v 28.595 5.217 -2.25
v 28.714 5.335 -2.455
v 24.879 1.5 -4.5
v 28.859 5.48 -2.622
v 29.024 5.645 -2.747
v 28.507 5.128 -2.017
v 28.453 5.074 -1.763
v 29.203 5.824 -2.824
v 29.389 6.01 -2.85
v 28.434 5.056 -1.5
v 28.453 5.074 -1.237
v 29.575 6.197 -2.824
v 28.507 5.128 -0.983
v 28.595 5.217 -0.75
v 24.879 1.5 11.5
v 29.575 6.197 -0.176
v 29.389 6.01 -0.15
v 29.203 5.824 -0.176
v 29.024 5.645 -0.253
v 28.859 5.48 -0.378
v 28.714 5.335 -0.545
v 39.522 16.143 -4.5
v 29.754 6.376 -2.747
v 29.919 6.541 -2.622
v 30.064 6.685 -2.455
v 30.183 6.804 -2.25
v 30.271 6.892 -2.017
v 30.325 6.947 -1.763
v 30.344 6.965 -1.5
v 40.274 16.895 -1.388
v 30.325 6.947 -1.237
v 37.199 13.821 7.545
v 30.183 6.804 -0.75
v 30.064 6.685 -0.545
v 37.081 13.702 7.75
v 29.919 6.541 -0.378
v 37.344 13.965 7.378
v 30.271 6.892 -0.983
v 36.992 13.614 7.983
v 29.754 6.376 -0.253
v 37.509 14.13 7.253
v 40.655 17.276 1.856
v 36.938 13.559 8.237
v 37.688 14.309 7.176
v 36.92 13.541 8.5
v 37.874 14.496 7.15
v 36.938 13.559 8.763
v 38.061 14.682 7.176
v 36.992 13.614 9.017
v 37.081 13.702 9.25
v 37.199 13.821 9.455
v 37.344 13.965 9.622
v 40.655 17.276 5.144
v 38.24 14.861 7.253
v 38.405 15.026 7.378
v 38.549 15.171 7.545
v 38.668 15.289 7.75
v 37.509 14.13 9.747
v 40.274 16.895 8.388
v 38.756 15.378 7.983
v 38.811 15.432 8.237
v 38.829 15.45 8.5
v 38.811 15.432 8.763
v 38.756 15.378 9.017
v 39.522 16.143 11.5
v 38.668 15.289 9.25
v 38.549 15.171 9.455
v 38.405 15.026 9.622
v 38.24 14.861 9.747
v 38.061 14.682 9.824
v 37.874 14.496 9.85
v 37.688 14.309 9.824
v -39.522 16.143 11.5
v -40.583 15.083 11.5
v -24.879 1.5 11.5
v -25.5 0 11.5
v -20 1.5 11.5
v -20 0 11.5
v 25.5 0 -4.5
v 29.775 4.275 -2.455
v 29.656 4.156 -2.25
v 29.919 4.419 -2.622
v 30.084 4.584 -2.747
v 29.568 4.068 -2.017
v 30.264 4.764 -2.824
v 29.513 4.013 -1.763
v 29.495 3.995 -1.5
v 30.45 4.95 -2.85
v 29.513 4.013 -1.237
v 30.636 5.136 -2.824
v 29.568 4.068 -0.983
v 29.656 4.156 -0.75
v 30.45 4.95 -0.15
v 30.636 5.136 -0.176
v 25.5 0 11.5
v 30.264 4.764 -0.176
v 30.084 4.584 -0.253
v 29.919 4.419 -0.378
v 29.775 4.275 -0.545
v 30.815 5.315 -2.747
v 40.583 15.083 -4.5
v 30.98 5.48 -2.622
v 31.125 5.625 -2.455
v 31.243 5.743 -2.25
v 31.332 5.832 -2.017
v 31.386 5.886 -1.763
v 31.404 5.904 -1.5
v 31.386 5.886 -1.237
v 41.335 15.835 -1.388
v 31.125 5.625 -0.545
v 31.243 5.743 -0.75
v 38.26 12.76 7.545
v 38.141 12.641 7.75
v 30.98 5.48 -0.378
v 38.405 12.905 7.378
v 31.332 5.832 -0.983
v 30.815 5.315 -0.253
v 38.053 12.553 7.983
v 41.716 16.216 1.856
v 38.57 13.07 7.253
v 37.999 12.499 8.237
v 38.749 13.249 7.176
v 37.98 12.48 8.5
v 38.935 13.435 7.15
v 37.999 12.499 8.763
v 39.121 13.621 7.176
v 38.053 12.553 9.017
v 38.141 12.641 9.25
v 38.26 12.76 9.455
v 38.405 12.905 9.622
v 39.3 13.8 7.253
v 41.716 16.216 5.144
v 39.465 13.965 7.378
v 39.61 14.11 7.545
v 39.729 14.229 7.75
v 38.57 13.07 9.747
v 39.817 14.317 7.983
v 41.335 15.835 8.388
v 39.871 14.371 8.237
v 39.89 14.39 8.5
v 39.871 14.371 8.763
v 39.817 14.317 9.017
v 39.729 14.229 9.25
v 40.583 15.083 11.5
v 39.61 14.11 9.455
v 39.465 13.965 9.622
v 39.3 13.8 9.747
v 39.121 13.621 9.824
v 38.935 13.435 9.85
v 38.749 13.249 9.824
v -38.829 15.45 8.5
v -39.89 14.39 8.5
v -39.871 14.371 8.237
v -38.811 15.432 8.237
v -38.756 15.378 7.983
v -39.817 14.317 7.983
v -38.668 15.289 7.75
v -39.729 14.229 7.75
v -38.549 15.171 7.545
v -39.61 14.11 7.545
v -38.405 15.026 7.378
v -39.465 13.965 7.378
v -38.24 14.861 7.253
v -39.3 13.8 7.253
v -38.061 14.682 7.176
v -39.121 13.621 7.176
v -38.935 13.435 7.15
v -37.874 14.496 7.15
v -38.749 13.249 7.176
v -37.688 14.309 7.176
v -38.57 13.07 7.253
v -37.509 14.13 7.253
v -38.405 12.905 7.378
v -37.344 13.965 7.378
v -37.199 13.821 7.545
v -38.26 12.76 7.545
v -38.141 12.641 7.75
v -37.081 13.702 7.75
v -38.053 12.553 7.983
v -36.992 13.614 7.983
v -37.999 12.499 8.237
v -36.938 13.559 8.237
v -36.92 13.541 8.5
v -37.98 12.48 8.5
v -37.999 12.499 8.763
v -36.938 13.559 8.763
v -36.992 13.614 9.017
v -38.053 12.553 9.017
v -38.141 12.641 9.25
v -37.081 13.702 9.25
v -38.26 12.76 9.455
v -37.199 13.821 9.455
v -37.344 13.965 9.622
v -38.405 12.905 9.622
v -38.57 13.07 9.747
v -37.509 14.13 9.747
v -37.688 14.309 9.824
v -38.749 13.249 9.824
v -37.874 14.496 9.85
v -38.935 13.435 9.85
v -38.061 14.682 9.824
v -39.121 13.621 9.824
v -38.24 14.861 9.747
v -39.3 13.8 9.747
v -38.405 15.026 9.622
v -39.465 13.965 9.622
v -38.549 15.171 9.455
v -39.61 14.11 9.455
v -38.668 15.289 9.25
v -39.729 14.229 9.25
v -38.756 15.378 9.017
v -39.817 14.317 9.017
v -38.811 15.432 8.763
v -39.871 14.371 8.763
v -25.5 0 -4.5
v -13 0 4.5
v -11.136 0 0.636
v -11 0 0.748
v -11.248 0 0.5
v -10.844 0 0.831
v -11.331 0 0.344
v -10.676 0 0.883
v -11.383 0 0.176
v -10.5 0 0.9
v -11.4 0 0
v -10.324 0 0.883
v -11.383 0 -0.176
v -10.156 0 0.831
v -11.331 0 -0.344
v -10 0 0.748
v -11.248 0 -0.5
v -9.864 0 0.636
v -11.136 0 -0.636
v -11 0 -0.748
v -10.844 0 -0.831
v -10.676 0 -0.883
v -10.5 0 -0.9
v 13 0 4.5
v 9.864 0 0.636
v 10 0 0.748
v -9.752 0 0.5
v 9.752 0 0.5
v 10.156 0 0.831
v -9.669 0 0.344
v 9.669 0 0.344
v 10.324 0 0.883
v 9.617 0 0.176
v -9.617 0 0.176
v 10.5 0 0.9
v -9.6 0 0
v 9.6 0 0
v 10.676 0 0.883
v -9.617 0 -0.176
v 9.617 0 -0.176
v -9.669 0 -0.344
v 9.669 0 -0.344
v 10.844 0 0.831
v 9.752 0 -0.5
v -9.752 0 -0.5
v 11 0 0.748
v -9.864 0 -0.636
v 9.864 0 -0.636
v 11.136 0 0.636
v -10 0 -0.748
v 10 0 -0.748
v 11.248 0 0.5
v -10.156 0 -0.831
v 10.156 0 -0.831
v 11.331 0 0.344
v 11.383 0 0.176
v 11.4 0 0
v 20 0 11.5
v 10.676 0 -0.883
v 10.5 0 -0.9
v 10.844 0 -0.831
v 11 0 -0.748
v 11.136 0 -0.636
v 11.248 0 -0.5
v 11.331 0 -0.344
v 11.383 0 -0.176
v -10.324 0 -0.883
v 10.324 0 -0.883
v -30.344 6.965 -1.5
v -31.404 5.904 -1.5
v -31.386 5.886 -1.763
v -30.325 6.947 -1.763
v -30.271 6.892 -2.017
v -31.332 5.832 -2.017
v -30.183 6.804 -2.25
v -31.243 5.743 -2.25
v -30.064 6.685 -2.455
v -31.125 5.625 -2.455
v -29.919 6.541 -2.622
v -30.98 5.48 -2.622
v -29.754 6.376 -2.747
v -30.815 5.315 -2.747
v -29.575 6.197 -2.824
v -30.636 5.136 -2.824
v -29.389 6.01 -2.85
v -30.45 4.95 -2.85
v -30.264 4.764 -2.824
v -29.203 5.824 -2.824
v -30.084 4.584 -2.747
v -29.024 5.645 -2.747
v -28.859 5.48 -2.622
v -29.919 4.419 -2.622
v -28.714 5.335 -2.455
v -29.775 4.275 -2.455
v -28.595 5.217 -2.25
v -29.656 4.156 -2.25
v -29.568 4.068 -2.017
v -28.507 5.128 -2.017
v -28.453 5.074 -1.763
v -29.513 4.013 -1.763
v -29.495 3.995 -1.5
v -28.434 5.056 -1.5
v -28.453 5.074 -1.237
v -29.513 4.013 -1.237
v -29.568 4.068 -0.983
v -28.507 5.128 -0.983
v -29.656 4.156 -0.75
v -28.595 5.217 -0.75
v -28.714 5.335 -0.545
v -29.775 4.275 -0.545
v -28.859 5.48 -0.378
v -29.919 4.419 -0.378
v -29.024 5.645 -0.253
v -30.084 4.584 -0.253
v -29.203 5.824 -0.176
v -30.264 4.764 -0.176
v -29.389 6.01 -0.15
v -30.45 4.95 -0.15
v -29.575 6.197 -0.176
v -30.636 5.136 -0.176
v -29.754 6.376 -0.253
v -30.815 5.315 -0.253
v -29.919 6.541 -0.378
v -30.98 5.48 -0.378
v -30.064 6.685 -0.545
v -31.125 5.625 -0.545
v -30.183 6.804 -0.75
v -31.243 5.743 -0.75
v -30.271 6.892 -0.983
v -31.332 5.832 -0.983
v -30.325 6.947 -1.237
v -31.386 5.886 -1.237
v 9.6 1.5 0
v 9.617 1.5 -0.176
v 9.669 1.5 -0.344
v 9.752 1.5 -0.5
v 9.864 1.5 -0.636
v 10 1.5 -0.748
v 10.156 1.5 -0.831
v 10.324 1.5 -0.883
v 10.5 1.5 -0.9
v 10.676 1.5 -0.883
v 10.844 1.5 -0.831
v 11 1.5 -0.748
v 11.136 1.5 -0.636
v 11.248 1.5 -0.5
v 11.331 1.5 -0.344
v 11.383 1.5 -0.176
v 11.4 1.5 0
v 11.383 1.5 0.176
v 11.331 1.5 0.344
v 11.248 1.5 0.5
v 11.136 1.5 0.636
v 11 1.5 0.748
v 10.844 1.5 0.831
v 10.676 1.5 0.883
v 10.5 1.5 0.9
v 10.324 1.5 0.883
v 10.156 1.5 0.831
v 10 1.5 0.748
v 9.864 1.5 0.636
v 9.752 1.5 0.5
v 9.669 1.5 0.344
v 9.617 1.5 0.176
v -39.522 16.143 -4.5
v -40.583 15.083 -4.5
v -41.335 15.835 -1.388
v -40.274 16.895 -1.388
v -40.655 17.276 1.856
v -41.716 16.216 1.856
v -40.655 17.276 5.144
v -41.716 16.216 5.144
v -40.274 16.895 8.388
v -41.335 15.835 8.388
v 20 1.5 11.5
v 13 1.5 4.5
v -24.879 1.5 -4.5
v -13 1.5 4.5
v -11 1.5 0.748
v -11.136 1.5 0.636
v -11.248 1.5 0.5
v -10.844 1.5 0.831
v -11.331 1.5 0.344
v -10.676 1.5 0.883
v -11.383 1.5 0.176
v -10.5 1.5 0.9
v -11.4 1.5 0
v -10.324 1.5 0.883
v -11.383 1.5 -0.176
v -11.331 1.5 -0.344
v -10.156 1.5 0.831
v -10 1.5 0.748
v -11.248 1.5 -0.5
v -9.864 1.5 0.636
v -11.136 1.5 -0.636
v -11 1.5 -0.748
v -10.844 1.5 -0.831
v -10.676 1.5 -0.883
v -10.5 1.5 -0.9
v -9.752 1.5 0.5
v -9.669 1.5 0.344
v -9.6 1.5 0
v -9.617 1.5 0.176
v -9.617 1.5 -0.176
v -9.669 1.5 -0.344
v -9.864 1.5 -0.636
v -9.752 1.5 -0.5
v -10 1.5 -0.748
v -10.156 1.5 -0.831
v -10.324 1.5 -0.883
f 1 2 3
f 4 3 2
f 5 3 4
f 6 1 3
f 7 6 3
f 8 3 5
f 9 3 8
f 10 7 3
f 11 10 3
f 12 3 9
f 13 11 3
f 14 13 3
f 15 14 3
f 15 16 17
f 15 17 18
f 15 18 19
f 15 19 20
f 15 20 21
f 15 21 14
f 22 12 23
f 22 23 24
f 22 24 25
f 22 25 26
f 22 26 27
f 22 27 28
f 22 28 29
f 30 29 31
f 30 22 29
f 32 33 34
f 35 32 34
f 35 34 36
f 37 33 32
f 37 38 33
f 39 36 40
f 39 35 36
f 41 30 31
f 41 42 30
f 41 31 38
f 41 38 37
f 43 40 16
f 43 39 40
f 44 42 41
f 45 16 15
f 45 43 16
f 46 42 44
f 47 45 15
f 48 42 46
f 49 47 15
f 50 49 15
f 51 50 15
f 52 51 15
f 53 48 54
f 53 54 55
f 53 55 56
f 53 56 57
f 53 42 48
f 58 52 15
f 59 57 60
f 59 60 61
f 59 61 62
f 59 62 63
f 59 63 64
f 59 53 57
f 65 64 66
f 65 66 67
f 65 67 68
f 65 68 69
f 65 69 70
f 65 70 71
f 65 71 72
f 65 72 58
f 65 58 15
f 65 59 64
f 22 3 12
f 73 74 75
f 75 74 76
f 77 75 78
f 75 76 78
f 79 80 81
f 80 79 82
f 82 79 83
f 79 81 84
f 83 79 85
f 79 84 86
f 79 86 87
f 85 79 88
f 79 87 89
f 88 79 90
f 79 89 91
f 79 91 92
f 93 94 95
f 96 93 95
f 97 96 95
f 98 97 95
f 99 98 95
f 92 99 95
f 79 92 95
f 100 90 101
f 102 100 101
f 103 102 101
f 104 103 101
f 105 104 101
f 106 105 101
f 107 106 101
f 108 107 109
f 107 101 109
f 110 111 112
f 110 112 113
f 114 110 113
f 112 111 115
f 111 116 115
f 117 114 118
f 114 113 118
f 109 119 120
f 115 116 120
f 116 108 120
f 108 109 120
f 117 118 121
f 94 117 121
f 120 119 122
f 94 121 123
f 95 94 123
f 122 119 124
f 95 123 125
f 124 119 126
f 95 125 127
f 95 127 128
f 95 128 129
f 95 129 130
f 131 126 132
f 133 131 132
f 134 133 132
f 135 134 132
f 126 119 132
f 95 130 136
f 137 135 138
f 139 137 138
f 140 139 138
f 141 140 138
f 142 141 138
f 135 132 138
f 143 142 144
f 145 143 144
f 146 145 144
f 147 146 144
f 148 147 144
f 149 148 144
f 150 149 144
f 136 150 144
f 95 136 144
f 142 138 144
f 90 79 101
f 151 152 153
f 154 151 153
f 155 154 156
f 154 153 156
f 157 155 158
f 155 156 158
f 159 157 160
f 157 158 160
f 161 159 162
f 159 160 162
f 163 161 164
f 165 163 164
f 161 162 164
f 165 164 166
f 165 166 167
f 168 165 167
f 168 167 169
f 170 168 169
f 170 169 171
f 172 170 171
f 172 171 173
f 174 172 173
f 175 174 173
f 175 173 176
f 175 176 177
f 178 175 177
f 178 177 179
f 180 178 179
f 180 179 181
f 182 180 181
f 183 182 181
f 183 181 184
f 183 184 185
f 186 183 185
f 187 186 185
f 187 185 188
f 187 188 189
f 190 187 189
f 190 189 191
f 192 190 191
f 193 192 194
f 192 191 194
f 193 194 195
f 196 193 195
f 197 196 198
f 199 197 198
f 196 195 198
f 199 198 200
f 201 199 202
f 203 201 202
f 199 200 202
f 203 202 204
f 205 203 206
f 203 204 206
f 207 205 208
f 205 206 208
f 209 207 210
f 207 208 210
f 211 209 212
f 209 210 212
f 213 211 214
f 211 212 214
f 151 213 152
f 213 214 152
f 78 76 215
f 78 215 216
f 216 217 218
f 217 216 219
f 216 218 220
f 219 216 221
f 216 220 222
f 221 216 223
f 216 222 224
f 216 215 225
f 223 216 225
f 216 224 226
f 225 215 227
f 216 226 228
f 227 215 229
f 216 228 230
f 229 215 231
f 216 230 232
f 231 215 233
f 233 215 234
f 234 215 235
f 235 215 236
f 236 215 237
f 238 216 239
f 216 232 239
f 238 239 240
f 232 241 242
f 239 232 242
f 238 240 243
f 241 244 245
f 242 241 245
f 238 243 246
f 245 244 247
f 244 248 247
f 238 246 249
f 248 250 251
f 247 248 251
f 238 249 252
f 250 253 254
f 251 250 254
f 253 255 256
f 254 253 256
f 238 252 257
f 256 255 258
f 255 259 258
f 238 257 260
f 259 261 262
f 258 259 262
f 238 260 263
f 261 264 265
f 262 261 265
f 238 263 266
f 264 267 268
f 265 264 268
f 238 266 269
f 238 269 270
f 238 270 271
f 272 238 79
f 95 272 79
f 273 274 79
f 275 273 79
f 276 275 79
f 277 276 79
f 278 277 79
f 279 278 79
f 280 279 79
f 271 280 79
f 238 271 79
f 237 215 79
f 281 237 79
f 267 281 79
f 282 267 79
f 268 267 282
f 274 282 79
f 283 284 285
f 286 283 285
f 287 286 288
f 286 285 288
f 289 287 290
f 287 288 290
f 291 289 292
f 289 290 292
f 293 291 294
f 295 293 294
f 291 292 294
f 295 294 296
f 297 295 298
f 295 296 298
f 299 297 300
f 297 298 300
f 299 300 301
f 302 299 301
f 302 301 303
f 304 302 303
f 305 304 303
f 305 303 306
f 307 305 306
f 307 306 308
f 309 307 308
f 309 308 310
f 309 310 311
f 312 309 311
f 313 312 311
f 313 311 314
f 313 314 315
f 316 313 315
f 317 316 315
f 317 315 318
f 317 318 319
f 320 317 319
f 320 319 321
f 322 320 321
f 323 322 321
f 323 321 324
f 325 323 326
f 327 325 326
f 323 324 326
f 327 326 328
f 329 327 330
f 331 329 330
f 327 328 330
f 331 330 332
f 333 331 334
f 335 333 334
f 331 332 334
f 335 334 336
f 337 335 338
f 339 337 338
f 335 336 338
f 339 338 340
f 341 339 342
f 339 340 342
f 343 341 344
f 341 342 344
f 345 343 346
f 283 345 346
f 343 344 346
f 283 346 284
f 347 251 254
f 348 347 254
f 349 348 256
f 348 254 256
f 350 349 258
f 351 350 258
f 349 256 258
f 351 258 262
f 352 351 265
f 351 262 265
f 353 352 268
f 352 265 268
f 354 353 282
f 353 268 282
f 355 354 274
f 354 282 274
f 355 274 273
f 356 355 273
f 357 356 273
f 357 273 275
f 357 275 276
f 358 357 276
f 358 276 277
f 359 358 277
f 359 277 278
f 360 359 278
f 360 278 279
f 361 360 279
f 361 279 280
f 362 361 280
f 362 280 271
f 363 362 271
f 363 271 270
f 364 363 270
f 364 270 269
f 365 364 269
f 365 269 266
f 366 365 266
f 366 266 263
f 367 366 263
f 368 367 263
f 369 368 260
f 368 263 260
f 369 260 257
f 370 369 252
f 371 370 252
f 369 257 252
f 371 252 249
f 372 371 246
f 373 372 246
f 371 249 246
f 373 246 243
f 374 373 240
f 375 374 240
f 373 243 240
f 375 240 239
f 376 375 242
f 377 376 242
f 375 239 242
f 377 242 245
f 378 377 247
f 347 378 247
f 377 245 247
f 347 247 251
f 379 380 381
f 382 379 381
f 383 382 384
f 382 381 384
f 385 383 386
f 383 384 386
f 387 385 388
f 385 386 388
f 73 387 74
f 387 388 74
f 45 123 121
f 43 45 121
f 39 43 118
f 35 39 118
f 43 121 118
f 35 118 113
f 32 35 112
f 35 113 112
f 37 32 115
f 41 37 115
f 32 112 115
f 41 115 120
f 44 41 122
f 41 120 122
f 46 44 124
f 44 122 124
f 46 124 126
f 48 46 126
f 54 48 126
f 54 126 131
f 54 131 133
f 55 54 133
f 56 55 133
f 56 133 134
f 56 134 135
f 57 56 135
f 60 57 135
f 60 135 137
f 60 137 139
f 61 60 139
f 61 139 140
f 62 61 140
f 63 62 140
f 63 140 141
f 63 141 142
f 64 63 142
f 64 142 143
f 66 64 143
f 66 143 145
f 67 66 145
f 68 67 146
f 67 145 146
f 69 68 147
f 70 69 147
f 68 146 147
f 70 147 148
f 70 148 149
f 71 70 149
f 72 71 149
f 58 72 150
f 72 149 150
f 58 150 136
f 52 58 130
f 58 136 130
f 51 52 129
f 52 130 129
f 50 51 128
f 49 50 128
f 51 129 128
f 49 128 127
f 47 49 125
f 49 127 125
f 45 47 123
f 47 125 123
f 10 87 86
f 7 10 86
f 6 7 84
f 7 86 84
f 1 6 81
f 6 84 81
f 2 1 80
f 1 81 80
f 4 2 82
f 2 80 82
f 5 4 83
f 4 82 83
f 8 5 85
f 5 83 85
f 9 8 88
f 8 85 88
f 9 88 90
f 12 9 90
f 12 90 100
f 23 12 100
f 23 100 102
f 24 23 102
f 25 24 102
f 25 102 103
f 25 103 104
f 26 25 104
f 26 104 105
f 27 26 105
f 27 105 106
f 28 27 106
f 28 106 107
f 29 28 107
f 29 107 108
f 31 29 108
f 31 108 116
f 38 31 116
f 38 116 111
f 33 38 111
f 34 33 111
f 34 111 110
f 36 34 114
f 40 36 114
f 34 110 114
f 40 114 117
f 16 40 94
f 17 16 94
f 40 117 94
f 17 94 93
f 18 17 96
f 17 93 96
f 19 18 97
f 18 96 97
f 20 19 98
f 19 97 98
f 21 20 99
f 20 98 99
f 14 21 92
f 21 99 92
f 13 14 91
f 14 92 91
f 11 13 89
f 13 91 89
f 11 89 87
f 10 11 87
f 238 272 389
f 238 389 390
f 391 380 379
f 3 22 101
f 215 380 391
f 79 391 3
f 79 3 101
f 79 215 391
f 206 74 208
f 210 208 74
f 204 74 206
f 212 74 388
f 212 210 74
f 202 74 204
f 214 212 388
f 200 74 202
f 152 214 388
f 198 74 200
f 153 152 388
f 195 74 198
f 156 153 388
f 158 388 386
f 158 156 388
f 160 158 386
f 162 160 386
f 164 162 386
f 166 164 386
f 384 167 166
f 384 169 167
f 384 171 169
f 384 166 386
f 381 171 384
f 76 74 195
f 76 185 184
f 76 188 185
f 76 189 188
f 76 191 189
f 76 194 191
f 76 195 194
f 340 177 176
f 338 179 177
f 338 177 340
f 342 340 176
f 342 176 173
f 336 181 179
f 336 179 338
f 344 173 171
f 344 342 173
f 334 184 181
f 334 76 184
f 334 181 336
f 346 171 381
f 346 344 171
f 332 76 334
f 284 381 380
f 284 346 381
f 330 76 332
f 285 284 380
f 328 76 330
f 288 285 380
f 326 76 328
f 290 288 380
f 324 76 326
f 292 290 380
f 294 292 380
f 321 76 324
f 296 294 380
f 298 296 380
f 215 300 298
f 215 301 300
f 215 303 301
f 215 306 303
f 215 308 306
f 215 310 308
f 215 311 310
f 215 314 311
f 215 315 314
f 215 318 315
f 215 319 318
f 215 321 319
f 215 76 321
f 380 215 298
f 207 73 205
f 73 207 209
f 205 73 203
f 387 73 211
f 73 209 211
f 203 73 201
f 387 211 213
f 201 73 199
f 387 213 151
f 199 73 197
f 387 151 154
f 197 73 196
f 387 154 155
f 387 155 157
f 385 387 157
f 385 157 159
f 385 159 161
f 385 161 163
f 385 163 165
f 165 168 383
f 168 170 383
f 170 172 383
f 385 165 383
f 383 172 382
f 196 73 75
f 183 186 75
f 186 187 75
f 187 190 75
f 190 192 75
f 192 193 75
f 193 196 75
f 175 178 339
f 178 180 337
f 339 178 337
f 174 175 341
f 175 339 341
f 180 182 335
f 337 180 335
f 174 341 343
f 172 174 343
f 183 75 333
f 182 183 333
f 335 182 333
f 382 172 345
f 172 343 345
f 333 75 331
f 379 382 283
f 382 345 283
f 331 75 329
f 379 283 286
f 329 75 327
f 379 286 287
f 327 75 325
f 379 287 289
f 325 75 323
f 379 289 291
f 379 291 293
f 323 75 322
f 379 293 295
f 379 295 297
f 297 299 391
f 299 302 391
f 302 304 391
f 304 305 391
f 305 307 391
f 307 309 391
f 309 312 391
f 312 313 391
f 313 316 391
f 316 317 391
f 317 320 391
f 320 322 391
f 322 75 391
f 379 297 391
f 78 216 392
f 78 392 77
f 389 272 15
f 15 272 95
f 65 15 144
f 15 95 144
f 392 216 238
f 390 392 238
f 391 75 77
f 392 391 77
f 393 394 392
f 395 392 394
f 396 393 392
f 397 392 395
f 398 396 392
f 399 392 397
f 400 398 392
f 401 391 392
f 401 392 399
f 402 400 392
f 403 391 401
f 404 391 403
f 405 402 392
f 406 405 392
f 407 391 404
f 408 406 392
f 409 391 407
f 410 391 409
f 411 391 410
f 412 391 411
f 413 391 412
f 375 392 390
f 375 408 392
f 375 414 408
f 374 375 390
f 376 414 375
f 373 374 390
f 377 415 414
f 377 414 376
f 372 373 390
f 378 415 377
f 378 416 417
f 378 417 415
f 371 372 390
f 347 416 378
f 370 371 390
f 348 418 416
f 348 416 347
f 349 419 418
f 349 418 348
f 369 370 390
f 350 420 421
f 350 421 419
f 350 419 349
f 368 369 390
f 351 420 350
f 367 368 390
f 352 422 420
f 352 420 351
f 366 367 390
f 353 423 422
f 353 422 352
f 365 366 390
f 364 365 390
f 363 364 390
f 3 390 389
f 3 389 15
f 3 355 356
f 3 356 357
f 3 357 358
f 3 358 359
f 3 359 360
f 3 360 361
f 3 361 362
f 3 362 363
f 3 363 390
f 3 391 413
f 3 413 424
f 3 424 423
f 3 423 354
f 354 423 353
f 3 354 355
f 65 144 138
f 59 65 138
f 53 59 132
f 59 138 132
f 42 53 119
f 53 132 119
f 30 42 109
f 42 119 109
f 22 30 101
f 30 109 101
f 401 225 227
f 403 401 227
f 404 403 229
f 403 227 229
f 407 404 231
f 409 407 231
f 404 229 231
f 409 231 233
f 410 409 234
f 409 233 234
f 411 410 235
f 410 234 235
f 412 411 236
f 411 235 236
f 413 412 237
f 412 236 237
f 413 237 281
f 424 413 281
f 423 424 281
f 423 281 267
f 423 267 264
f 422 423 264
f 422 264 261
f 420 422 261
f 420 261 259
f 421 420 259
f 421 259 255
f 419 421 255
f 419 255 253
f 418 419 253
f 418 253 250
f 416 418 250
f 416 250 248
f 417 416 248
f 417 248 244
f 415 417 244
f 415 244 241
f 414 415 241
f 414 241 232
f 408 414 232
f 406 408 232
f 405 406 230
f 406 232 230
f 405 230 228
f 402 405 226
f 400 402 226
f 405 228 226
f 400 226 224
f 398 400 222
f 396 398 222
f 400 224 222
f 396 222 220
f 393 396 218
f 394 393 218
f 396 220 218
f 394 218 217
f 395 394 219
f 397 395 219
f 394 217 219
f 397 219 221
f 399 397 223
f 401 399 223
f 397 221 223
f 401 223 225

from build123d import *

# Parameters (mm, degrees)
MIDDLE_SKETCH_W               = 5.5
MIDDLE_SKETCH_H               = 16
MIDDLE_SKETCH_W_2             = 26
MIDDLE_SKETCH_H_2             = 9
MIDDLE_EXTRUDE_DEPTH          = 1.5
OFFSHOOT_RIGHT_PLANE_SKETCH_W = 16
OFFSHOOT_RIGHT_PLANE_SKETCH_H = 21.33030278
RIGHT_OFFSHOOT_EXTRUDE_DEPTH  = 1.5
OFFSHOOT_LEFT_PLANE_SKETCH_W  = 16
OFFSHOOT_LEFT_PLANE_SKETCH_H  = 21.33030278
LEFT_OFFSHOOT_EXTRUDE_DEPTH   = 1.5
F_2_7_2_7_DIAMETER_HOLE1_D    = 2.7
F_2_7_2_7_DIAMETER_HOLE2_D    = 2.7
F_1_8_1_8_DIAMETER_HOLE1_D    = 1.8


with BuildPart() as part:
    # Middle Sketch → Middle Extrude (new body)
    with BuildSketch(Plane(origin=(0, 0, 0), x_dir=(1, 0, 0), z_dir=(0, 1, 0))):
        with Locations((-22.75, -3.5)):
            Rectangle(MIDDLE_SKETCH_W, MIDDLE_SKETCH_H)
        Polygon((-20, -11.5), (-20, 4.5), (-13, 4.5), (-13, -4.5), align=None)
        Rectangle(MIDDLE_SKETCH_W_2, MIDDLE_SKETCH_H_2)
        Polygon((13, 4.5), (20, 4.5), (20, -11.5), (13, -4.5), align=None)
        with Locations((22.75, -3.5)):
            Rectangle(MIDDLE_SKETCH_W, MIDDLE_SKETCH_H)
    extrude(amount=MIDDLE_EXTRUDE_DEPTH)

    # Offshoot Right Plane Sketch → Right Offshoot Extrude (add)
    with BuildSketch(Plane(origin=(12.75, -12.75, 0), x_dir=(0, 0, -1), z_dir=(0.707106781, -0.707106781, 0))):
        with BuildLine():
            Line((4.5, 39.3615257), (-11.5, 39.3615257))
            ThreePointArc((-11.5, 39.3615257), (-3.5, 41.03122292), (4.5, 39.3615257))
        make_face()
        with Locations((-3.5, 28.69637431)):
            Rectangle(OFFSHOOT_RIGHT_PLANE_SKETCH_W, OFFSHOOT_RIGHT_PLANE_SKETCH_H)
    extrude(amount=-RIGHT_OFFSHOOT_EXTRUDE_DEPTH)

    # Offshoot Left Plane Sketch → Left Offshoot Extrude (add)
    with BuildSketch(Plane(origin=(-12.75, -12.75, 0), x_dir=(0, 0, -1), z_dir=(-0.707106781, -0.707106781, 0))):
        with Locations((-3.5, -28.69637431)):
            Rectangle(OFFSHOOT_LEFT_PLANE_SKETCH_W, OFFSHOOT_LEFT_PLANE_SKETCH_H)
        with BuildLine():
            ThreePointArc((4.5, -39.3615257), (-3.5, -41.03122292), (-11.5, -39.3615257))
            Line((-11.5, -39.3615257), (4.5, -39.3615257))
        make_face()
    extrude(amount=-LEFT_OFFSHOOT_EXTRUDE_DEPTH)

    # Ø2.7 (2.7) Diameter Hole1 (through all)
    with Locations(Plane(origin=(-11.689339828, -11.689339828, 0), x_dir=(0.707106781, -0.707106781, 0), z_dir=(0.707106781, 0.707106781, 0))):
        with Locations((-37.03122292, -8.5), (-25.03122292, 1.5)):
            Hole(F_2_7_2_7_DIAMETER_HOLE1_D / 2)

    # Ø2.7 (2.7) Diameter Hole2 (through all)
    with Locations(Plane(origin=(11.689339828, -11.689339828, 0), x_dir=(0.707106781, 0.707106781, 0), z_dir=(-0.707106781, 0.707106781, 0))):
        with Locations((25.03122292, 1.5), (37.03122292, -8.5)):
            Hole(F_2_7_2_7_DIAMETER_HOLE2_D / 2)

    # Ø1.8 (1.8) Diameter Hole1 (through all)
    with Locations(Plane(origin=(0, 1.5, 0), x_dir=(1, 0, 0), z_dir=(0, 1, 0))):
        with Locations((-10.5, 0), (10.5, 0)):
            Hole(F_1_8_1_8_DIAMETER_HOLE1_D / 2)


solid = part.part
